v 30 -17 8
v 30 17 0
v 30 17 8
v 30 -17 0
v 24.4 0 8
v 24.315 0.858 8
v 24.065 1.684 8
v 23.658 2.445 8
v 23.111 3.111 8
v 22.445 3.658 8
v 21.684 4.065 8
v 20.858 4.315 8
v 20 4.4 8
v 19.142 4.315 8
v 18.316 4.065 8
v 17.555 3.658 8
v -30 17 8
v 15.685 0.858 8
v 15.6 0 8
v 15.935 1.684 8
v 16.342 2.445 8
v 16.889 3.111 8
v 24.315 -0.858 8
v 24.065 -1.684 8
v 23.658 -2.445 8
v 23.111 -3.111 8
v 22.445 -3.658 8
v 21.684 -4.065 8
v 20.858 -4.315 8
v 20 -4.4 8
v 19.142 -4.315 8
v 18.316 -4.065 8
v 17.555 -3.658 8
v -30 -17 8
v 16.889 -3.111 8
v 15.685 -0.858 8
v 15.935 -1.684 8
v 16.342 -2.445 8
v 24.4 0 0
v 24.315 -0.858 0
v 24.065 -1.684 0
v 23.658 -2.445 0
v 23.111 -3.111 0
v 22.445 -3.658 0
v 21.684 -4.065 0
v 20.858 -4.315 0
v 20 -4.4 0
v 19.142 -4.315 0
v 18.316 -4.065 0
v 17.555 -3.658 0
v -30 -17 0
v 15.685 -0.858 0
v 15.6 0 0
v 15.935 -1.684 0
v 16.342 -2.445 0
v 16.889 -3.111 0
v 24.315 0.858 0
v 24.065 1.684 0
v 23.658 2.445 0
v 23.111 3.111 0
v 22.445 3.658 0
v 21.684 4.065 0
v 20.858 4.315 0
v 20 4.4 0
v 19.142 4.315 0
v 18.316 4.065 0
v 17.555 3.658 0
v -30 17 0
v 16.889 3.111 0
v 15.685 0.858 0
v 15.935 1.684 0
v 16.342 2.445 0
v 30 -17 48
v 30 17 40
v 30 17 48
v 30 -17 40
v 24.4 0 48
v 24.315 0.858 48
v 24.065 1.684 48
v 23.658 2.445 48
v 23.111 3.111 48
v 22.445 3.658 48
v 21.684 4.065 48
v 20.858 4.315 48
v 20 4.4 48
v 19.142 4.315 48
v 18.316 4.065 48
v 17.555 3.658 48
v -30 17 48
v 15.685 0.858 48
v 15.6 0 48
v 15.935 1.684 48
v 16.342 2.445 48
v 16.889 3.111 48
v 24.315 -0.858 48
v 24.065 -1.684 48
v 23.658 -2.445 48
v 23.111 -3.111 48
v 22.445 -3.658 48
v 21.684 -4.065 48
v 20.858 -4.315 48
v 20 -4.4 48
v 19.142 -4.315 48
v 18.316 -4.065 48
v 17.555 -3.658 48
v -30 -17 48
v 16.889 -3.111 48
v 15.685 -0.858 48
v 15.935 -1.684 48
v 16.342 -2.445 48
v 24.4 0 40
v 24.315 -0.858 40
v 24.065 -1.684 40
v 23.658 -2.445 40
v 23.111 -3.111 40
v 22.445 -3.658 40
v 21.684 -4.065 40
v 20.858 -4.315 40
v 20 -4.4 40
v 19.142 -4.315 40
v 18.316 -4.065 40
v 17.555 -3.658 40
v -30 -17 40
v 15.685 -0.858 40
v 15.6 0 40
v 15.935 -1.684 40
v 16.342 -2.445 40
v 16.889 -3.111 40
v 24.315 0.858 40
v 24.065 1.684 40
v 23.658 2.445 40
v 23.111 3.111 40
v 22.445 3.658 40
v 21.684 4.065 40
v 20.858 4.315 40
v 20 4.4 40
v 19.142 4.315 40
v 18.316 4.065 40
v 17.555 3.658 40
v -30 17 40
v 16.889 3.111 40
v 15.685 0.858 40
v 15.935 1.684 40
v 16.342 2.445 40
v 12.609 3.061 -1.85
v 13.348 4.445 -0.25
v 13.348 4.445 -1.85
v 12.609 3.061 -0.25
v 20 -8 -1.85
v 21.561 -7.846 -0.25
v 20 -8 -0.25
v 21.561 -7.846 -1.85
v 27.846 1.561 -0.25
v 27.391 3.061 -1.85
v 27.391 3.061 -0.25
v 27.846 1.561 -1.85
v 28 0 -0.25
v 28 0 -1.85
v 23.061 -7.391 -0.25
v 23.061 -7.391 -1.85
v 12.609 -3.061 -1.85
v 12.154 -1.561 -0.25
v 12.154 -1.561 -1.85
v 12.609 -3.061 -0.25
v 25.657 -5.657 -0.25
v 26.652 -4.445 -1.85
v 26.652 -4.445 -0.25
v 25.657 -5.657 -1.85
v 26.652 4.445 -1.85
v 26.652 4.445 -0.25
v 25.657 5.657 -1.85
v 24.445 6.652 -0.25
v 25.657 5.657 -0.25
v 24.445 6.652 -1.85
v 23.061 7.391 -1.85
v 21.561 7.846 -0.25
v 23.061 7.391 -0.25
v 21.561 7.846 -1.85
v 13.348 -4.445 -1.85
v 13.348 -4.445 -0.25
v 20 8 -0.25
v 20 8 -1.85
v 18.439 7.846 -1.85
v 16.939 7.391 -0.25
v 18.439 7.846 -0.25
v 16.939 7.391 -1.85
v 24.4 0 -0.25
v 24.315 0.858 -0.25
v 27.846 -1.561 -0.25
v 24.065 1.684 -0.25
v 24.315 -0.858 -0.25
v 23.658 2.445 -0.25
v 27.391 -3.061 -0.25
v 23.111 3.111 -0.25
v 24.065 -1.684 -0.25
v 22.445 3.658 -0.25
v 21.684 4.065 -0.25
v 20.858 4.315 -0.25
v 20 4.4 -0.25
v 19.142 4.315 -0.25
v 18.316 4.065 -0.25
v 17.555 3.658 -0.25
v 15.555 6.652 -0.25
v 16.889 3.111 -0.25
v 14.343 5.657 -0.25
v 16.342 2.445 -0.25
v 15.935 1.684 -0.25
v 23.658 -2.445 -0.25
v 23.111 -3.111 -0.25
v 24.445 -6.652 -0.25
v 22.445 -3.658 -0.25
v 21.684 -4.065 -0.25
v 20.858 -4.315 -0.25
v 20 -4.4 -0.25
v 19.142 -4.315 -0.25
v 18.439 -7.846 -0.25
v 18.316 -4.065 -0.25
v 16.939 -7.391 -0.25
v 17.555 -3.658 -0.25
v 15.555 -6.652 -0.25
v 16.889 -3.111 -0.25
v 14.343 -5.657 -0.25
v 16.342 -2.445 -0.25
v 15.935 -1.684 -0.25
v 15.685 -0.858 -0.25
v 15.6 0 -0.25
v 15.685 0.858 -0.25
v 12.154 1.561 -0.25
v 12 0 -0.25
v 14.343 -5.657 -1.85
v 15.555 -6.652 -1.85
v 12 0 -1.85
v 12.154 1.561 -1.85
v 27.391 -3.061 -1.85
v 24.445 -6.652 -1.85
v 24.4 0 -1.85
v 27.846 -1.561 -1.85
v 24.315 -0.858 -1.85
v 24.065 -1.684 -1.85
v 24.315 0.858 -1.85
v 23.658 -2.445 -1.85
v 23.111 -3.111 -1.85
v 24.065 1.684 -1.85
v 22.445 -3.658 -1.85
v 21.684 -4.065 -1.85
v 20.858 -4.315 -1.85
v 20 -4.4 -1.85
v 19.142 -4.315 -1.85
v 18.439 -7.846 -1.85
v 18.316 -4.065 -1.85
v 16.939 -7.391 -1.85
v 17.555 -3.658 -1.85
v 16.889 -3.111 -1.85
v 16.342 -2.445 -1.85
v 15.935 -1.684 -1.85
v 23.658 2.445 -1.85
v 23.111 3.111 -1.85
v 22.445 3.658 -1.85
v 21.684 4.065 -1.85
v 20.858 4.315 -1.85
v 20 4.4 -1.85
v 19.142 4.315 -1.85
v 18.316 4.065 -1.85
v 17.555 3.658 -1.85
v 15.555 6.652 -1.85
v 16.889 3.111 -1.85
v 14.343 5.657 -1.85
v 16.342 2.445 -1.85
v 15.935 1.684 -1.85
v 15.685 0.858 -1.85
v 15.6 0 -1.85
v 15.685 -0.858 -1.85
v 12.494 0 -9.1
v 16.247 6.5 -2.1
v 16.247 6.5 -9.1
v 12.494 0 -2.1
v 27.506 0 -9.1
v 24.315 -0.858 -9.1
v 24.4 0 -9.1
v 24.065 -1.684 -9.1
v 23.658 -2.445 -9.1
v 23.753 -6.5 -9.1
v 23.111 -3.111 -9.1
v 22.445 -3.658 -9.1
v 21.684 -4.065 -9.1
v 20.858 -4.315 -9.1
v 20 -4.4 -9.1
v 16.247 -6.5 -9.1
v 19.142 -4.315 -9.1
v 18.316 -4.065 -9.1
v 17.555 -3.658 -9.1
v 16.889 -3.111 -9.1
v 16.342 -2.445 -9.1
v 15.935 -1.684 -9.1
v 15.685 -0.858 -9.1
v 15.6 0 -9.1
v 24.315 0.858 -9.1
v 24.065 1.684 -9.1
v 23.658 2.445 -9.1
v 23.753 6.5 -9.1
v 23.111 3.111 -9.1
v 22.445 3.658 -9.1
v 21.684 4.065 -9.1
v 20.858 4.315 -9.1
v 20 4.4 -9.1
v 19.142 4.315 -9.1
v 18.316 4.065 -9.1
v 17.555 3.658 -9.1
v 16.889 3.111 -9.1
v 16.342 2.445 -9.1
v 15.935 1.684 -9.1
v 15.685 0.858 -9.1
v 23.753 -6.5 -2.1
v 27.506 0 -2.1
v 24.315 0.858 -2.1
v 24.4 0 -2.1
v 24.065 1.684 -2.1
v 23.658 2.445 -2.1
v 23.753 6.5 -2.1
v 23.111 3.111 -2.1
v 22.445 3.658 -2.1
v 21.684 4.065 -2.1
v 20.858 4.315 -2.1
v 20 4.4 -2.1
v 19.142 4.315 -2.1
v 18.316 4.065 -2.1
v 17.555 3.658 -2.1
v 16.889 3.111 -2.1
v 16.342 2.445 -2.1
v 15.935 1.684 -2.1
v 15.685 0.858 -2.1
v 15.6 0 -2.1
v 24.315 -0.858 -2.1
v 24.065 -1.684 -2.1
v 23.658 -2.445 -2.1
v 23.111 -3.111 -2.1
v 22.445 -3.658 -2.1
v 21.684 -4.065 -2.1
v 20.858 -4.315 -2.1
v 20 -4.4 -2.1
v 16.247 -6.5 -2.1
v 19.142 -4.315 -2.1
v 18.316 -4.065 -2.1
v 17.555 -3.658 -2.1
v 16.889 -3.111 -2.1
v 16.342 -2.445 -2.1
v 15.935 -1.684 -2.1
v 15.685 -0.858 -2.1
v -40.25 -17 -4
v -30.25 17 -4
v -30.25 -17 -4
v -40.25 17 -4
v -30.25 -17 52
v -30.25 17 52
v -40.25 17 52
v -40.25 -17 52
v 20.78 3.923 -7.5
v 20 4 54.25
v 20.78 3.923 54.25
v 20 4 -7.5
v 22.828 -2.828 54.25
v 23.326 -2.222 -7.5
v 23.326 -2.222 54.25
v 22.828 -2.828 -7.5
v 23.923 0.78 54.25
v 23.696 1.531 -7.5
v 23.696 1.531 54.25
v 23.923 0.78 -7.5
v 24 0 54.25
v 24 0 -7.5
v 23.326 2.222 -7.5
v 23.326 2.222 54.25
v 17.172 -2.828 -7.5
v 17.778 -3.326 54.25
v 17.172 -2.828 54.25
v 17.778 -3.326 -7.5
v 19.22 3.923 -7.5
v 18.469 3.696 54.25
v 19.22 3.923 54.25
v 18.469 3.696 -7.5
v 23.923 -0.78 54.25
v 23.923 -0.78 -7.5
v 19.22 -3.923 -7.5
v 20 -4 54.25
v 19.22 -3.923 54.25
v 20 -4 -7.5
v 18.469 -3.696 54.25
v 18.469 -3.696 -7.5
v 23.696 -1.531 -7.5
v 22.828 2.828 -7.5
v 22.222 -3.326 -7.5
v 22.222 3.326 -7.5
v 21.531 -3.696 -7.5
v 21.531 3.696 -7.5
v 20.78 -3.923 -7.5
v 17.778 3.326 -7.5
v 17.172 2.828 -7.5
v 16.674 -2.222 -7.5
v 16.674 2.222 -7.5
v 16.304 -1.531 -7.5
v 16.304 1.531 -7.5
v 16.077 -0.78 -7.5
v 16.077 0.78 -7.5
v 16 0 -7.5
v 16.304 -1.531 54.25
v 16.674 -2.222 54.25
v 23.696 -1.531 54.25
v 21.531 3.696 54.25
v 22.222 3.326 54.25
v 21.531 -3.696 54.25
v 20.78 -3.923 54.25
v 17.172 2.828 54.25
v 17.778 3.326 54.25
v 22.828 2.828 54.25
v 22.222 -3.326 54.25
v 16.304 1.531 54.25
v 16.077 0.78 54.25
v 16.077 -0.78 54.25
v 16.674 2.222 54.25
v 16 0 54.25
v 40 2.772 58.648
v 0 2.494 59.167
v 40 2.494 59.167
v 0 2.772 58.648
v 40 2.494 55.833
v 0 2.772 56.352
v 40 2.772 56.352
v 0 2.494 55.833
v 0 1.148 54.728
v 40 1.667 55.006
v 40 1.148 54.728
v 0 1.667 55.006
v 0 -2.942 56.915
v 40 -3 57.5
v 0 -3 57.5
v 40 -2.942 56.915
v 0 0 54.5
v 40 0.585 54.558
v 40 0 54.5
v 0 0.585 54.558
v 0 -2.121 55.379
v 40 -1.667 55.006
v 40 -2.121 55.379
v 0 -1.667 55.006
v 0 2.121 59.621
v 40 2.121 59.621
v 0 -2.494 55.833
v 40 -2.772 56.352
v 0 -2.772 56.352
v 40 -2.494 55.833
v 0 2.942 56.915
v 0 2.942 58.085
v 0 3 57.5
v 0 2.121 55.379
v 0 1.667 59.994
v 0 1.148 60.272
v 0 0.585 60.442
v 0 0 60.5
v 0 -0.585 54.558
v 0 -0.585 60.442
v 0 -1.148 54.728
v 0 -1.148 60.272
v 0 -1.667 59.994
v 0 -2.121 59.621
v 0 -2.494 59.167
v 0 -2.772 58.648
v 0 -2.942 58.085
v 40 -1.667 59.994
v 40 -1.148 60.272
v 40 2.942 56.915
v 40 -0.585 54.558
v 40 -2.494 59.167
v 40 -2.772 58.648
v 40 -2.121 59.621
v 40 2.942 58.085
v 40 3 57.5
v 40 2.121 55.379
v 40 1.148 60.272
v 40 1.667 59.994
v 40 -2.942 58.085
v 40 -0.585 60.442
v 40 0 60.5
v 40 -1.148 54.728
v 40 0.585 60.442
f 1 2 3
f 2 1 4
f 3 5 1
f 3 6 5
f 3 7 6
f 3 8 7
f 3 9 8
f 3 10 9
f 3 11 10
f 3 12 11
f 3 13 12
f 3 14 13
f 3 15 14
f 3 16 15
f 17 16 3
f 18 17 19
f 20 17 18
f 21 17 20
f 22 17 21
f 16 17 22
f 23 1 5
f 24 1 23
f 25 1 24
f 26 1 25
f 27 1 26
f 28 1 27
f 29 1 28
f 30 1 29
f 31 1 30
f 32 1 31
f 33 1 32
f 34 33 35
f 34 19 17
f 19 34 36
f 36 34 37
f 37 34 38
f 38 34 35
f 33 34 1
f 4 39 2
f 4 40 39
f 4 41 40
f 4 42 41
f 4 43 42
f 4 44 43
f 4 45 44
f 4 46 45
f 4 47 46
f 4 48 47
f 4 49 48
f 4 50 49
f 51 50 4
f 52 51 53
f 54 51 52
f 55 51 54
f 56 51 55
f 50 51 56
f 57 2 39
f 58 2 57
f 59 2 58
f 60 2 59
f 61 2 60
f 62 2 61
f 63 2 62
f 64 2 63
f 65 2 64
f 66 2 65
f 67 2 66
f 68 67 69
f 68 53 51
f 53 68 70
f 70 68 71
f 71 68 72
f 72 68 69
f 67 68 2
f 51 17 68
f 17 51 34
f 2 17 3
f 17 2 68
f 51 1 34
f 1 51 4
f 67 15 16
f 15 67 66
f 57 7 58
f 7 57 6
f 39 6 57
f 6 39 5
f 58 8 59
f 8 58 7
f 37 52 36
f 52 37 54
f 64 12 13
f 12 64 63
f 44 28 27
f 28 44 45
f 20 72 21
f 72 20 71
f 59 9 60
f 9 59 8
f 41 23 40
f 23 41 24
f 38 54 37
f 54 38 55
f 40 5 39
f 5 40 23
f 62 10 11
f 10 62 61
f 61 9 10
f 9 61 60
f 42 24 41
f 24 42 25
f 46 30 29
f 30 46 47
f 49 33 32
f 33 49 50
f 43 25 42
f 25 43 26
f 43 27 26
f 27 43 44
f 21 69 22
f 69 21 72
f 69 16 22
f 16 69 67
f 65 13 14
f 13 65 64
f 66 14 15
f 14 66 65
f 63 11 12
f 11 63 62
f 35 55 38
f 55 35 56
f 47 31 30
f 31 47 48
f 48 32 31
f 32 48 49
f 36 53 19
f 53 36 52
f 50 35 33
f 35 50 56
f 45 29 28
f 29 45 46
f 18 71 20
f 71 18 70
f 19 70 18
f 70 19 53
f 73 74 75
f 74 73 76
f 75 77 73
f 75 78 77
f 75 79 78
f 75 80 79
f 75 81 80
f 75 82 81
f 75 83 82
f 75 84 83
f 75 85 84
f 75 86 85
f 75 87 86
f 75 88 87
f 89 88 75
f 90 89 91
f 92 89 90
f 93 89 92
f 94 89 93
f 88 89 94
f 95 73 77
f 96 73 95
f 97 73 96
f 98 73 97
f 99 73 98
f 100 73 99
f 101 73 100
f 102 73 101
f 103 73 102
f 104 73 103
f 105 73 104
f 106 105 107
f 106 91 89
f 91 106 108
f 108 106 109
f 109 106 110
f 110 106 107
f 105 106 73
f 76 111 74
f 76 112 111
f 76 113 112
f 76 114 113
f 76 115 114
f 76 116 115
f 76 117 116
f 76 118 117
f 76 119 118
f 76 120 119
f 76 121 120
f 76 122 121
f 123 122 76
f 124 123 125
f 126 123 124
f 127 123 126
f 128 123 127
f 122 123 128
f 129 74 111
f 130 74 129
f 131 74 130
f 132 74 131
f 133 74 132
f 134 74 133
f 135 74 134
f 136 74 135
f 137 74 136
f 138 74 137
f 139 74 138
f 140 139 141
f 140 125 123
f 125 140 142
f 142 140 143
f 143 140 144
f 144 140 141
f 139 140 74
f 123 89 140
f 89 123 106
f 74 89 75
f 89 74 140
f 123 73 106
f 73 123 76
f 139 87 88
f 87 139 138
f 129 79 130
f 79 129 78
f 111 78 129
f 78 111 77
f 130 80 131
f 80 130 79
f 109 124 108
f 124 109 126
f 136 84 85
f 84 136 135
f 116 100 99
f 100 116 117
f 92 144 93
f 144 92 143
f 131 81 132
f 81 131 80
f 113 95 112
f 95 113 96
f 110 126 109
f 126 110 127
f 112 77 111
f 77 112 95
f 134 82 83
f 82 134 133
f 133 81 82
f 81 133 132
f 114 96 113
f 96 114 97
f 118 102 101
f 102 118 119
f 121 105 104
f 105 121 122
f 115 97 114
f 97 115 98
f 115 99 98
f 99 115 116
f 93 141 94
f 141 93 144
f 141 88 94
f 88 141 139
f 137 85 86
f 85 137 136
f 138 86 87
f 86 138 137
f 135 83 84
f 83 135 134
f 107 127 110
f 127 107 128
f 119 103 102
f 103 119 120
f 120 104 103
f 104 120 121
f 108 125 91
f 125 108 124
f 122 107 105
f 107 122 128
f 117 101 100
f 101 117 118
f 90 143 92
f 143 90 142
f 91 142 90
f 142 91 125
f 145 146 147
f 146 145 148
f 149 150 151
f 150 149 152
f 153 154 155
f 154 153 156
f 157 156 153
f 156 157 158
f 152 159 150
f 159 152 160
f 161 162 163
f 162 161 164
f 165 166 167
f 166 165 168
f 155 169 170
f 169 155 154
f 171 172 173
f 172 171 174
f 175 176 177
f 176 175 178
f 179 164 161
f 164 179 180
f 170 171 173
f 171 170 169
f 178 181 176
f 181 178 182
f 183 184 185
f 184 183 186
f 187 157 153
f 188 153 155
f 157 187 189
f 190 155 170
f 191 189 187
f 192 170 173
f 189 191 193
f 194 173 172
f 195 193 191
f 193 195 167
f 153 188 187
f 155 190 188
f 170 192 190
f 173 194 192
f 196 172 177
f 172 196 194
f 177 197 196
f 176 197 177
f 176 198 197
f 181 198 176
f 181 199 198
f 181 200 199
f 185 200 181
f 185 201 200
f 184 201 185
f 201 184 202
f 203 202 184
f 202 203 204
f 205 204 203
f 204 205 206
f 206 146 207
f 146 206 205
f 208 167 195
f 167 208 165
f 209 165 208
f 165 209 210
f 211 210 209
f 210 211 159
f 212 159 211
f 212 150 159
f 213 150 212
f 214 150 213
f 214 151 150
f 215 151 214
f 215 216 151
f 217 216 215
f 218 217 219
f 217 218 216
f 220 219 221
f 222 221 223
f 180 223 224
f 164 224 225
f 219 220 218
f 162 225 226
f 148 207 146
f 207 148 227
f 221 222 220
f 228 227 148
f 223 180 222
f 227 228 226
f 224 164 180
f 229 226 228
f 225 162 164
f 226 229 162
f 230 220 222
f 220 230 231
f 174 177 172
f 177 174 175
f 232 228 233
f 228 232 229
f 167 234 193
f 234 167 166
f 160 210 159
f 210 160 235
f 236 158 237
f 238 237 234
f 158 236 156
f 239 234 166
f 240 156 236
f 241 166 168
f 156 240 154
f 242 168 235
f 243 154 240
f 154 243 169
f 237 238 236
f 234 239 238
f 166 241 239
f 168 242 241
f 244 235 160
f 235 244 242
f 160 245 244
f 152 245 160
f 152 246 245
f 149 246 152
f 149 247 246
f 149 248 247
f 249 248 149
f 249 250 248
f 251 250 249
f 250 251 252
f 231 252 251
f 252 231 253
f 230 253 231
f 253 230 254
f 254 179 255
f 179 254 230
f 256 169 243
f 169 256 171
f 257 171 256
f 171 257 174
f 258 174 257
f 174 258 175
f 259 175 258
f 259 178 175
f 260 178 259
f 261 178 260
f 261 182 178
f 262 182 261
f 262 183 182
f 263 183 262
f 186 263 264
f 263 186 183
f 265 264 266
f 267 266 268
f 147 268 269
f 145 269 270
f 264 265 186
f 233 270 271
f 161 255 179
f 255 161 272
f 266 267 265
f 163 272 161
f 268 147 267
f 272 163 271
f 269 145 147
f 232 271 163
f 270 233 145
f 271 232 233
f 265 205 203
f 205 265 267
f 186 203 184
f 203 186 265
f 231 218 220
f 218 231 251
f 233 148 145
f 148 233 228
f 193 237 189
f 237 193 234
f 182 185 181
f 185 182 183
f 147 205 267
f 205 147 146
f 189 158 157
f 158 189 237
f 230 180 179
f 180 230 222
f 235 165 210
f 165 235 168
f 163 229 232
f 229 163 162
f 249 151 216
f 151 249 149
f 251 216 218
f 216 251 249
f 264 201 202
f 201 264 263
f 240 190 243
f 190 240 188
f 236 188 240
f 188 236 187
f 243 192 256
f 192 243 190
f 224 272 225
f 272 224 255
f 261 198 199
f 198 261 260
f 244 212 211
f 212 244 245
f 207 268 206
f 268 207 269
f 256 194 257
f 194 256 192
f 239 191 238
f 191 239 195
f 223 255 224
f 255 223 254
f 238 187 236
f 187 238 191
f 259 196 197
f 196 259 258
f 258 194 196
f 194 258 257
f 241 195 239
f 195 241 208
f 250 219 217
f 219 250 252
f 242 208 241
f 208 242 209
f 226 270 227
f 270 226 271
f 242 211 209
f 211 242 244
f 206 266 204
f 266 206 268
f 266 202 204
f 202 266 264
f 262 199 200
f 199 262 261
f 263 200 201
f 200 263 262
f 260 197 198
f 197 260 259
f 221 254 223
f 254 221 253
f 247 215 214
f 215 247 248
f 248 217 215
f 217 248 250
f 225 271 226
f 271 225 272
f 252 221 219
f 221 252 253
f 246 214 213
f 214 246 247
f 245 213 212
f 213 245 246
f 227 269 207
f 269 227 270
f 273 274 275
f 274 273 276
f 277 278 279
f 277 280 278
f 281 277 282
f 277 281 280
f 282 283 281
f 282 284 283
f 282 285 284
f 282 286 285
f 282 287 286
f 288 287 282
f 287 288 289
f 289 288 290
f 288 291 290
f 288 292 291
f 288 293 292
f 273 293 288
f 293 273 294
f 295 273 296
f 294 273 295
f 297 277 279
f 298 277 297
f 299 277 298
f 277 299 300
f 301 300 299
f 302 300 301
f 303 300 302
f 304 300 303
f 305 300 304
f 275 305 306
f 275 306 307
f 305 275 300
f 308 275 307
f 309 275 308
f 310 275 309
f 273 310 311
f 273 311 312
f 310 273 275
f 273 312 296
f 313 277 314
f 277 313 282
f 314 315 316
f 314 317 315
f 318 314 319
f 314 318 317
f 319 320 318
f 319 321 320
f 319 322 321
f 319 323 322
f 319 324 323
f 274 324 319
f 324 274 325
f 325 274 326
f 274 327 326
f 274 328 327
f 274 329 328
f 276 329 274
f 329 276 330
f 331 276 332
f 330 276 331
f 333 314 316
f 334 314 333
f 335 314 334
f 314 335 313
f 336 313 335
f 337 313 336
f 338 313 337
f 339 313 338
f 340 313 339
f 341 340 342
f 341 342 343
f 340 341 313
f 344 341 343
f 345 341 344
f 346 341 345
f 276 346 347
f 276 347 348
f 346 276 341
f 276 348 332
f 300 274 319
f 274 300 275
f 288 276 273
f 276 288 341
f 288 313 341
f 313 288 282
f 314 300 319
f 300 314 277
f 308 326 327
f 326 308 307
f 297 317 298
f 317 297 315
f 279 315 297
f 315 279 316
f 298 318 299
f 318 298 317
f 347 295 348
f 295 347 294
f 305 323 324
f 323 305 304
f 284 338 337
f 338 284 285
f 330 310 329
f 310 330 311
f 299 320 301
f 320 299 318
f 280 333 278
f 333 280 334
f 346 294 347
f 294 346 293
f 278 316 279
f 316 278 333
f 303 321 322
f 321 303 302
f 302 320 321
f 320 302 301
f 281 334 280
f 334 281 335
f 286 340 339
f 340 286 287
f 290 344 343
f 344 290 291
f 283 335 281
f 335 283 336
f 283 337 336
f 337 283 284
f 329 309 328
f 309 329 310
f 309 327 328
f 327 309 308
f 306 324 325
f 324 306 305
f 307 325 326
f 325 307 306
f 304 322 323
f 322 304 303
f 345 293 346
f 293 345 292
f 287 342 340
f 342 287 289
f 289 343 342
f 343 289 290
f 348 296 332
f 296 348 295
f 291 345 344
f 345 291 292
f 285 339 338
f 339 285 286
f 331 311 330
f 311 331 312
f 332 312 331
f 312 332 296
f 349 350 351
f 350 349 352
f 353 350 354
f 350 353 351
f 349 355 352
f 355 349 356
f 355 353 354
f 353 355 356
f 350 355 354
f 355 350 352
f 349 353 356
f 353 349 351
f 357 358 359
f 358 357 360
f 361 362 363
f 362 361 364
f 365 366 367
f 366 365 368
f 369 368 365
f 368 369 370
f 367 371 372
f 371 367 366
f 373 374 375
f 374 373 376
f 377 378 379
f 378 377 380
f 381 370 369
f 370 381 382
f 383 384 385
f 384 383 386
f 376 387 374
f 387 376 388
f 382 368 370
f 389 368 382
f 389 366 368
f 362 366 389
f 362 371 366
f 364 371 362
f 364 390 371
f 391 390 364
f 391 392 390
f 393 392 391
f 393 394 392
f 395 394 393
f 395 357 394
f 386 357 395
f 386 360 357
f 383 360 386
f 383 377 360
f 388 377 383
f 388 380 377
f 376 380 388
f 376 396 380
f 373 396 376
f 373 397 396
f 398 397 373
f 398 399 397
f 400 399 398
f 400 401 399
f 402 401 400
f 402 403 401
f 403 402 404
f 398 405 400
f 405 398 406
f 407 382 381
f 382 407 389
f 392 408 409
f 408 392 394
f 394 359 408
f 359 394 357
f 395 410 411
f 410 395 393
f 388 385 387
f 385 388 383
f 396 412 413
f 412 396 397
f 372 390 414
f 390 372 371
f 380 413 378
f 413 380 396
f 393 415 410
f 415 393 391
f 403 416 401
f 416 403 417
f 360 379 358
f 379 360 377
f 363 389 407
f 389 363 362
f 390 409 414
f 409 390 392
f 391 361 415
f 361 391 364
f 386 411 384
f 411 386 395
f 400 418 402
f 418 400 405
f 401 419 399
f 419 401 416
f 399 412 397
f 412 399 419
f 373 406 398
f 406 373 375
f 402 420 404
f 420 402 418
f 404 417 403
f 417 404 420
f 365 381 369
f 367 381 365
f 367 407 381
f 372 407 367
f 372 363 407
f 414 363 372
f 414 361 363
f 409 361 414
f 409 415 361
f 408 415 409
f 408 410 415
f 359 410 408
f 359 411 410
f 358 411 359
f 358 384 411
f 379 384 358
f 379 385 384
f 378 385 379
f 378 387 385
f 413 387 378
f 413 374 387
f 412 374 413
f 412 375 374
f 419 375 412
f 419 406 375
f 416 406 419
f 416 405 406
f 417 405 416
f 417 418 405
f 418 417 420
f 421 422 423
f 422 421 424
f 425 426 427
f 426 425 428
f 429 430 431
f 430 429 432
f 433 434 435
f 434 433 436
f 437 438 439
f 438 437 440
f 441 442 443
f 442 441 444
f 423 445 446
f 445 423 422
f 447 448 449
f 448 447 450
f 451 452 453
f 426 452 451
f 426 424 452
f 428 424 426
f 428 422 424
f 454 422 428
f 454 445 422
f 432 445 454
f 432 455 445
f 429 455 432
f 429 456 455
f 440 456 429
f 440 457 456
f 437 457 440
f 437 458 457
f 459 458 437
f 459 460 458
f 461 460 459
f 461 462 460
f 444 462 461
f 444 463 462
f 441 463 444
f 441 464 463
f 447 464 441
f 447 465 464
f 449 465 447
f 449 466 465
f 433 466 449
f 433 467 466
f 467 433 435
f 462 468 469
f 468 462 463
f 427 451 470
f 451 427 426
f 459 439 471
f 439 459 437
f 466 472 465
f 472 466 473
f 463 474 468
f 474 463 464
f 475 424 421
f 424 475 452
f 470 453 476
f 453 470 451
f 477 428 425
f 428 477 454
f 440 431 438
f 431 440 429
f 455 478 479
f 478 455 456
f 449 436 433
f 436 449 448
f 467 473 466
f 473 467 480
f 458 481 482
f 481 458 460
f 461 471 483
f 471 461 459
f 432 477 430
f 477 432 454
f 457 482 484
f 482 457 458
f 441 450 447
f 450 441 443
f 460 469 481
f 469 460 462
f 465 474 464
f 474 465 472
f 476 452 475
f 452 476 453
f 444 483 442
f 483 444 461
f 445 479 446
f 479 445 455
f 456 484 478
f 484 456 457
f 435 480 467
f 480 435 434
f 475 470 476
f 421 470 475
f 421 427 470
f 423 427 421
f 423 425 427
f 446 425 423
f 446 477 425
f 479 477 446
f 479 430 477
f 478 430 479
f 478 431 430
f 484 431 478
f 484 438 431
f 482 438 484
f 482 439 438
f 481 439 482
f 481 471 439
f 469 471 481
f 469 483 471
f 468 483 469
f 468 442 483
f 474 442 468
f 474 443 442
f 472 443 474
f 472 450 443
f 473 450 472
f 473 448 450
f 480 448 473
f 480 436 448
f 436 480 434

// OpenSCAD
$fn = 32;

// ------------------------------------------------------------------------
// C clamp: throat 40 mm, screw d8
// Every part is its own module, assembly() places every instance.
// ------------------------------------------------------------------------

// --- part 1 ---
module clamp_arm() {
  difference() {
    translate([-30, -17, 0]) cube([60, 34, 8]);
    translate([20, 0, -1]) cylinder(h = 10, d = 8.8);
  }
}

// --- part 2 ---
module clamp_spine() {
  difference() {
    translate([-28, -17, 0]) cube([56, 34, 10]);
  }
}

// --- part 3 ---
module clamp_screw() {
  translate([0, 0, -30.875]) cylinder(h = 61.75, d = 8);
}

// --- part 4 ---
module clamp_washer() {
  difference() {
      translate([0, 0, 0]) cylinder(h = 1.6, d = 16);
      translate([0, 0, -1]) cylinder(h = 3.6, d = 8.8);
    }
}

// --- part 5 ---
module clamp_nut() {
  difference() {
    linear_extrude(height = 7) polygon(points = [[7.506, 0], [3.753, 6.5], [-3.753, 6.5], [-7.506, 0], [-3.753, -6.5], [3.753, -6.5]]);
    translate([0, 0, -1]) cylinder(h = 9, d = 8.8);
  }
}

// --- part 6 ---
module tommy_bar() {
  translate([0, 0, -20]) cylinder(h = 40, d = 6);
}

// --- assembly ---
module assembly() {
  color([0.80, 0.24, 0.20]) translate([0, 0, 0]) rotate([0, 0, 0]) clamp_arm();
  color([0.20, 0.45, 0.75]) translate([0, 0, 40]) rotate([0, 0, 0]) clamp_arm();
  color([0.25, 0.62, 0.32]) translate([-40.25, 0, 24]) rotate([0, 90, 0]) clamp_spine();
  color([0.92, 0.70, 0.18]) translate([20, 0, 23.375]) rotate([0, 0, 0]) clamp_screw();
  color([0.58, 0.35, 0.70]) translate([20, 0, -1.85]) rotate([0, 0, 0]) clamp_washer();
  color([0.16, 0.66, 0.66]) translate([20, 0, -9.1]) rotate([0, 0, 0]) clamp_nut();
  color([0.85, 0.48, 0.18]) translate([20, 0, 57.5]) rotate([0, 90, 0]) tommy_bar();
}

assembly();
